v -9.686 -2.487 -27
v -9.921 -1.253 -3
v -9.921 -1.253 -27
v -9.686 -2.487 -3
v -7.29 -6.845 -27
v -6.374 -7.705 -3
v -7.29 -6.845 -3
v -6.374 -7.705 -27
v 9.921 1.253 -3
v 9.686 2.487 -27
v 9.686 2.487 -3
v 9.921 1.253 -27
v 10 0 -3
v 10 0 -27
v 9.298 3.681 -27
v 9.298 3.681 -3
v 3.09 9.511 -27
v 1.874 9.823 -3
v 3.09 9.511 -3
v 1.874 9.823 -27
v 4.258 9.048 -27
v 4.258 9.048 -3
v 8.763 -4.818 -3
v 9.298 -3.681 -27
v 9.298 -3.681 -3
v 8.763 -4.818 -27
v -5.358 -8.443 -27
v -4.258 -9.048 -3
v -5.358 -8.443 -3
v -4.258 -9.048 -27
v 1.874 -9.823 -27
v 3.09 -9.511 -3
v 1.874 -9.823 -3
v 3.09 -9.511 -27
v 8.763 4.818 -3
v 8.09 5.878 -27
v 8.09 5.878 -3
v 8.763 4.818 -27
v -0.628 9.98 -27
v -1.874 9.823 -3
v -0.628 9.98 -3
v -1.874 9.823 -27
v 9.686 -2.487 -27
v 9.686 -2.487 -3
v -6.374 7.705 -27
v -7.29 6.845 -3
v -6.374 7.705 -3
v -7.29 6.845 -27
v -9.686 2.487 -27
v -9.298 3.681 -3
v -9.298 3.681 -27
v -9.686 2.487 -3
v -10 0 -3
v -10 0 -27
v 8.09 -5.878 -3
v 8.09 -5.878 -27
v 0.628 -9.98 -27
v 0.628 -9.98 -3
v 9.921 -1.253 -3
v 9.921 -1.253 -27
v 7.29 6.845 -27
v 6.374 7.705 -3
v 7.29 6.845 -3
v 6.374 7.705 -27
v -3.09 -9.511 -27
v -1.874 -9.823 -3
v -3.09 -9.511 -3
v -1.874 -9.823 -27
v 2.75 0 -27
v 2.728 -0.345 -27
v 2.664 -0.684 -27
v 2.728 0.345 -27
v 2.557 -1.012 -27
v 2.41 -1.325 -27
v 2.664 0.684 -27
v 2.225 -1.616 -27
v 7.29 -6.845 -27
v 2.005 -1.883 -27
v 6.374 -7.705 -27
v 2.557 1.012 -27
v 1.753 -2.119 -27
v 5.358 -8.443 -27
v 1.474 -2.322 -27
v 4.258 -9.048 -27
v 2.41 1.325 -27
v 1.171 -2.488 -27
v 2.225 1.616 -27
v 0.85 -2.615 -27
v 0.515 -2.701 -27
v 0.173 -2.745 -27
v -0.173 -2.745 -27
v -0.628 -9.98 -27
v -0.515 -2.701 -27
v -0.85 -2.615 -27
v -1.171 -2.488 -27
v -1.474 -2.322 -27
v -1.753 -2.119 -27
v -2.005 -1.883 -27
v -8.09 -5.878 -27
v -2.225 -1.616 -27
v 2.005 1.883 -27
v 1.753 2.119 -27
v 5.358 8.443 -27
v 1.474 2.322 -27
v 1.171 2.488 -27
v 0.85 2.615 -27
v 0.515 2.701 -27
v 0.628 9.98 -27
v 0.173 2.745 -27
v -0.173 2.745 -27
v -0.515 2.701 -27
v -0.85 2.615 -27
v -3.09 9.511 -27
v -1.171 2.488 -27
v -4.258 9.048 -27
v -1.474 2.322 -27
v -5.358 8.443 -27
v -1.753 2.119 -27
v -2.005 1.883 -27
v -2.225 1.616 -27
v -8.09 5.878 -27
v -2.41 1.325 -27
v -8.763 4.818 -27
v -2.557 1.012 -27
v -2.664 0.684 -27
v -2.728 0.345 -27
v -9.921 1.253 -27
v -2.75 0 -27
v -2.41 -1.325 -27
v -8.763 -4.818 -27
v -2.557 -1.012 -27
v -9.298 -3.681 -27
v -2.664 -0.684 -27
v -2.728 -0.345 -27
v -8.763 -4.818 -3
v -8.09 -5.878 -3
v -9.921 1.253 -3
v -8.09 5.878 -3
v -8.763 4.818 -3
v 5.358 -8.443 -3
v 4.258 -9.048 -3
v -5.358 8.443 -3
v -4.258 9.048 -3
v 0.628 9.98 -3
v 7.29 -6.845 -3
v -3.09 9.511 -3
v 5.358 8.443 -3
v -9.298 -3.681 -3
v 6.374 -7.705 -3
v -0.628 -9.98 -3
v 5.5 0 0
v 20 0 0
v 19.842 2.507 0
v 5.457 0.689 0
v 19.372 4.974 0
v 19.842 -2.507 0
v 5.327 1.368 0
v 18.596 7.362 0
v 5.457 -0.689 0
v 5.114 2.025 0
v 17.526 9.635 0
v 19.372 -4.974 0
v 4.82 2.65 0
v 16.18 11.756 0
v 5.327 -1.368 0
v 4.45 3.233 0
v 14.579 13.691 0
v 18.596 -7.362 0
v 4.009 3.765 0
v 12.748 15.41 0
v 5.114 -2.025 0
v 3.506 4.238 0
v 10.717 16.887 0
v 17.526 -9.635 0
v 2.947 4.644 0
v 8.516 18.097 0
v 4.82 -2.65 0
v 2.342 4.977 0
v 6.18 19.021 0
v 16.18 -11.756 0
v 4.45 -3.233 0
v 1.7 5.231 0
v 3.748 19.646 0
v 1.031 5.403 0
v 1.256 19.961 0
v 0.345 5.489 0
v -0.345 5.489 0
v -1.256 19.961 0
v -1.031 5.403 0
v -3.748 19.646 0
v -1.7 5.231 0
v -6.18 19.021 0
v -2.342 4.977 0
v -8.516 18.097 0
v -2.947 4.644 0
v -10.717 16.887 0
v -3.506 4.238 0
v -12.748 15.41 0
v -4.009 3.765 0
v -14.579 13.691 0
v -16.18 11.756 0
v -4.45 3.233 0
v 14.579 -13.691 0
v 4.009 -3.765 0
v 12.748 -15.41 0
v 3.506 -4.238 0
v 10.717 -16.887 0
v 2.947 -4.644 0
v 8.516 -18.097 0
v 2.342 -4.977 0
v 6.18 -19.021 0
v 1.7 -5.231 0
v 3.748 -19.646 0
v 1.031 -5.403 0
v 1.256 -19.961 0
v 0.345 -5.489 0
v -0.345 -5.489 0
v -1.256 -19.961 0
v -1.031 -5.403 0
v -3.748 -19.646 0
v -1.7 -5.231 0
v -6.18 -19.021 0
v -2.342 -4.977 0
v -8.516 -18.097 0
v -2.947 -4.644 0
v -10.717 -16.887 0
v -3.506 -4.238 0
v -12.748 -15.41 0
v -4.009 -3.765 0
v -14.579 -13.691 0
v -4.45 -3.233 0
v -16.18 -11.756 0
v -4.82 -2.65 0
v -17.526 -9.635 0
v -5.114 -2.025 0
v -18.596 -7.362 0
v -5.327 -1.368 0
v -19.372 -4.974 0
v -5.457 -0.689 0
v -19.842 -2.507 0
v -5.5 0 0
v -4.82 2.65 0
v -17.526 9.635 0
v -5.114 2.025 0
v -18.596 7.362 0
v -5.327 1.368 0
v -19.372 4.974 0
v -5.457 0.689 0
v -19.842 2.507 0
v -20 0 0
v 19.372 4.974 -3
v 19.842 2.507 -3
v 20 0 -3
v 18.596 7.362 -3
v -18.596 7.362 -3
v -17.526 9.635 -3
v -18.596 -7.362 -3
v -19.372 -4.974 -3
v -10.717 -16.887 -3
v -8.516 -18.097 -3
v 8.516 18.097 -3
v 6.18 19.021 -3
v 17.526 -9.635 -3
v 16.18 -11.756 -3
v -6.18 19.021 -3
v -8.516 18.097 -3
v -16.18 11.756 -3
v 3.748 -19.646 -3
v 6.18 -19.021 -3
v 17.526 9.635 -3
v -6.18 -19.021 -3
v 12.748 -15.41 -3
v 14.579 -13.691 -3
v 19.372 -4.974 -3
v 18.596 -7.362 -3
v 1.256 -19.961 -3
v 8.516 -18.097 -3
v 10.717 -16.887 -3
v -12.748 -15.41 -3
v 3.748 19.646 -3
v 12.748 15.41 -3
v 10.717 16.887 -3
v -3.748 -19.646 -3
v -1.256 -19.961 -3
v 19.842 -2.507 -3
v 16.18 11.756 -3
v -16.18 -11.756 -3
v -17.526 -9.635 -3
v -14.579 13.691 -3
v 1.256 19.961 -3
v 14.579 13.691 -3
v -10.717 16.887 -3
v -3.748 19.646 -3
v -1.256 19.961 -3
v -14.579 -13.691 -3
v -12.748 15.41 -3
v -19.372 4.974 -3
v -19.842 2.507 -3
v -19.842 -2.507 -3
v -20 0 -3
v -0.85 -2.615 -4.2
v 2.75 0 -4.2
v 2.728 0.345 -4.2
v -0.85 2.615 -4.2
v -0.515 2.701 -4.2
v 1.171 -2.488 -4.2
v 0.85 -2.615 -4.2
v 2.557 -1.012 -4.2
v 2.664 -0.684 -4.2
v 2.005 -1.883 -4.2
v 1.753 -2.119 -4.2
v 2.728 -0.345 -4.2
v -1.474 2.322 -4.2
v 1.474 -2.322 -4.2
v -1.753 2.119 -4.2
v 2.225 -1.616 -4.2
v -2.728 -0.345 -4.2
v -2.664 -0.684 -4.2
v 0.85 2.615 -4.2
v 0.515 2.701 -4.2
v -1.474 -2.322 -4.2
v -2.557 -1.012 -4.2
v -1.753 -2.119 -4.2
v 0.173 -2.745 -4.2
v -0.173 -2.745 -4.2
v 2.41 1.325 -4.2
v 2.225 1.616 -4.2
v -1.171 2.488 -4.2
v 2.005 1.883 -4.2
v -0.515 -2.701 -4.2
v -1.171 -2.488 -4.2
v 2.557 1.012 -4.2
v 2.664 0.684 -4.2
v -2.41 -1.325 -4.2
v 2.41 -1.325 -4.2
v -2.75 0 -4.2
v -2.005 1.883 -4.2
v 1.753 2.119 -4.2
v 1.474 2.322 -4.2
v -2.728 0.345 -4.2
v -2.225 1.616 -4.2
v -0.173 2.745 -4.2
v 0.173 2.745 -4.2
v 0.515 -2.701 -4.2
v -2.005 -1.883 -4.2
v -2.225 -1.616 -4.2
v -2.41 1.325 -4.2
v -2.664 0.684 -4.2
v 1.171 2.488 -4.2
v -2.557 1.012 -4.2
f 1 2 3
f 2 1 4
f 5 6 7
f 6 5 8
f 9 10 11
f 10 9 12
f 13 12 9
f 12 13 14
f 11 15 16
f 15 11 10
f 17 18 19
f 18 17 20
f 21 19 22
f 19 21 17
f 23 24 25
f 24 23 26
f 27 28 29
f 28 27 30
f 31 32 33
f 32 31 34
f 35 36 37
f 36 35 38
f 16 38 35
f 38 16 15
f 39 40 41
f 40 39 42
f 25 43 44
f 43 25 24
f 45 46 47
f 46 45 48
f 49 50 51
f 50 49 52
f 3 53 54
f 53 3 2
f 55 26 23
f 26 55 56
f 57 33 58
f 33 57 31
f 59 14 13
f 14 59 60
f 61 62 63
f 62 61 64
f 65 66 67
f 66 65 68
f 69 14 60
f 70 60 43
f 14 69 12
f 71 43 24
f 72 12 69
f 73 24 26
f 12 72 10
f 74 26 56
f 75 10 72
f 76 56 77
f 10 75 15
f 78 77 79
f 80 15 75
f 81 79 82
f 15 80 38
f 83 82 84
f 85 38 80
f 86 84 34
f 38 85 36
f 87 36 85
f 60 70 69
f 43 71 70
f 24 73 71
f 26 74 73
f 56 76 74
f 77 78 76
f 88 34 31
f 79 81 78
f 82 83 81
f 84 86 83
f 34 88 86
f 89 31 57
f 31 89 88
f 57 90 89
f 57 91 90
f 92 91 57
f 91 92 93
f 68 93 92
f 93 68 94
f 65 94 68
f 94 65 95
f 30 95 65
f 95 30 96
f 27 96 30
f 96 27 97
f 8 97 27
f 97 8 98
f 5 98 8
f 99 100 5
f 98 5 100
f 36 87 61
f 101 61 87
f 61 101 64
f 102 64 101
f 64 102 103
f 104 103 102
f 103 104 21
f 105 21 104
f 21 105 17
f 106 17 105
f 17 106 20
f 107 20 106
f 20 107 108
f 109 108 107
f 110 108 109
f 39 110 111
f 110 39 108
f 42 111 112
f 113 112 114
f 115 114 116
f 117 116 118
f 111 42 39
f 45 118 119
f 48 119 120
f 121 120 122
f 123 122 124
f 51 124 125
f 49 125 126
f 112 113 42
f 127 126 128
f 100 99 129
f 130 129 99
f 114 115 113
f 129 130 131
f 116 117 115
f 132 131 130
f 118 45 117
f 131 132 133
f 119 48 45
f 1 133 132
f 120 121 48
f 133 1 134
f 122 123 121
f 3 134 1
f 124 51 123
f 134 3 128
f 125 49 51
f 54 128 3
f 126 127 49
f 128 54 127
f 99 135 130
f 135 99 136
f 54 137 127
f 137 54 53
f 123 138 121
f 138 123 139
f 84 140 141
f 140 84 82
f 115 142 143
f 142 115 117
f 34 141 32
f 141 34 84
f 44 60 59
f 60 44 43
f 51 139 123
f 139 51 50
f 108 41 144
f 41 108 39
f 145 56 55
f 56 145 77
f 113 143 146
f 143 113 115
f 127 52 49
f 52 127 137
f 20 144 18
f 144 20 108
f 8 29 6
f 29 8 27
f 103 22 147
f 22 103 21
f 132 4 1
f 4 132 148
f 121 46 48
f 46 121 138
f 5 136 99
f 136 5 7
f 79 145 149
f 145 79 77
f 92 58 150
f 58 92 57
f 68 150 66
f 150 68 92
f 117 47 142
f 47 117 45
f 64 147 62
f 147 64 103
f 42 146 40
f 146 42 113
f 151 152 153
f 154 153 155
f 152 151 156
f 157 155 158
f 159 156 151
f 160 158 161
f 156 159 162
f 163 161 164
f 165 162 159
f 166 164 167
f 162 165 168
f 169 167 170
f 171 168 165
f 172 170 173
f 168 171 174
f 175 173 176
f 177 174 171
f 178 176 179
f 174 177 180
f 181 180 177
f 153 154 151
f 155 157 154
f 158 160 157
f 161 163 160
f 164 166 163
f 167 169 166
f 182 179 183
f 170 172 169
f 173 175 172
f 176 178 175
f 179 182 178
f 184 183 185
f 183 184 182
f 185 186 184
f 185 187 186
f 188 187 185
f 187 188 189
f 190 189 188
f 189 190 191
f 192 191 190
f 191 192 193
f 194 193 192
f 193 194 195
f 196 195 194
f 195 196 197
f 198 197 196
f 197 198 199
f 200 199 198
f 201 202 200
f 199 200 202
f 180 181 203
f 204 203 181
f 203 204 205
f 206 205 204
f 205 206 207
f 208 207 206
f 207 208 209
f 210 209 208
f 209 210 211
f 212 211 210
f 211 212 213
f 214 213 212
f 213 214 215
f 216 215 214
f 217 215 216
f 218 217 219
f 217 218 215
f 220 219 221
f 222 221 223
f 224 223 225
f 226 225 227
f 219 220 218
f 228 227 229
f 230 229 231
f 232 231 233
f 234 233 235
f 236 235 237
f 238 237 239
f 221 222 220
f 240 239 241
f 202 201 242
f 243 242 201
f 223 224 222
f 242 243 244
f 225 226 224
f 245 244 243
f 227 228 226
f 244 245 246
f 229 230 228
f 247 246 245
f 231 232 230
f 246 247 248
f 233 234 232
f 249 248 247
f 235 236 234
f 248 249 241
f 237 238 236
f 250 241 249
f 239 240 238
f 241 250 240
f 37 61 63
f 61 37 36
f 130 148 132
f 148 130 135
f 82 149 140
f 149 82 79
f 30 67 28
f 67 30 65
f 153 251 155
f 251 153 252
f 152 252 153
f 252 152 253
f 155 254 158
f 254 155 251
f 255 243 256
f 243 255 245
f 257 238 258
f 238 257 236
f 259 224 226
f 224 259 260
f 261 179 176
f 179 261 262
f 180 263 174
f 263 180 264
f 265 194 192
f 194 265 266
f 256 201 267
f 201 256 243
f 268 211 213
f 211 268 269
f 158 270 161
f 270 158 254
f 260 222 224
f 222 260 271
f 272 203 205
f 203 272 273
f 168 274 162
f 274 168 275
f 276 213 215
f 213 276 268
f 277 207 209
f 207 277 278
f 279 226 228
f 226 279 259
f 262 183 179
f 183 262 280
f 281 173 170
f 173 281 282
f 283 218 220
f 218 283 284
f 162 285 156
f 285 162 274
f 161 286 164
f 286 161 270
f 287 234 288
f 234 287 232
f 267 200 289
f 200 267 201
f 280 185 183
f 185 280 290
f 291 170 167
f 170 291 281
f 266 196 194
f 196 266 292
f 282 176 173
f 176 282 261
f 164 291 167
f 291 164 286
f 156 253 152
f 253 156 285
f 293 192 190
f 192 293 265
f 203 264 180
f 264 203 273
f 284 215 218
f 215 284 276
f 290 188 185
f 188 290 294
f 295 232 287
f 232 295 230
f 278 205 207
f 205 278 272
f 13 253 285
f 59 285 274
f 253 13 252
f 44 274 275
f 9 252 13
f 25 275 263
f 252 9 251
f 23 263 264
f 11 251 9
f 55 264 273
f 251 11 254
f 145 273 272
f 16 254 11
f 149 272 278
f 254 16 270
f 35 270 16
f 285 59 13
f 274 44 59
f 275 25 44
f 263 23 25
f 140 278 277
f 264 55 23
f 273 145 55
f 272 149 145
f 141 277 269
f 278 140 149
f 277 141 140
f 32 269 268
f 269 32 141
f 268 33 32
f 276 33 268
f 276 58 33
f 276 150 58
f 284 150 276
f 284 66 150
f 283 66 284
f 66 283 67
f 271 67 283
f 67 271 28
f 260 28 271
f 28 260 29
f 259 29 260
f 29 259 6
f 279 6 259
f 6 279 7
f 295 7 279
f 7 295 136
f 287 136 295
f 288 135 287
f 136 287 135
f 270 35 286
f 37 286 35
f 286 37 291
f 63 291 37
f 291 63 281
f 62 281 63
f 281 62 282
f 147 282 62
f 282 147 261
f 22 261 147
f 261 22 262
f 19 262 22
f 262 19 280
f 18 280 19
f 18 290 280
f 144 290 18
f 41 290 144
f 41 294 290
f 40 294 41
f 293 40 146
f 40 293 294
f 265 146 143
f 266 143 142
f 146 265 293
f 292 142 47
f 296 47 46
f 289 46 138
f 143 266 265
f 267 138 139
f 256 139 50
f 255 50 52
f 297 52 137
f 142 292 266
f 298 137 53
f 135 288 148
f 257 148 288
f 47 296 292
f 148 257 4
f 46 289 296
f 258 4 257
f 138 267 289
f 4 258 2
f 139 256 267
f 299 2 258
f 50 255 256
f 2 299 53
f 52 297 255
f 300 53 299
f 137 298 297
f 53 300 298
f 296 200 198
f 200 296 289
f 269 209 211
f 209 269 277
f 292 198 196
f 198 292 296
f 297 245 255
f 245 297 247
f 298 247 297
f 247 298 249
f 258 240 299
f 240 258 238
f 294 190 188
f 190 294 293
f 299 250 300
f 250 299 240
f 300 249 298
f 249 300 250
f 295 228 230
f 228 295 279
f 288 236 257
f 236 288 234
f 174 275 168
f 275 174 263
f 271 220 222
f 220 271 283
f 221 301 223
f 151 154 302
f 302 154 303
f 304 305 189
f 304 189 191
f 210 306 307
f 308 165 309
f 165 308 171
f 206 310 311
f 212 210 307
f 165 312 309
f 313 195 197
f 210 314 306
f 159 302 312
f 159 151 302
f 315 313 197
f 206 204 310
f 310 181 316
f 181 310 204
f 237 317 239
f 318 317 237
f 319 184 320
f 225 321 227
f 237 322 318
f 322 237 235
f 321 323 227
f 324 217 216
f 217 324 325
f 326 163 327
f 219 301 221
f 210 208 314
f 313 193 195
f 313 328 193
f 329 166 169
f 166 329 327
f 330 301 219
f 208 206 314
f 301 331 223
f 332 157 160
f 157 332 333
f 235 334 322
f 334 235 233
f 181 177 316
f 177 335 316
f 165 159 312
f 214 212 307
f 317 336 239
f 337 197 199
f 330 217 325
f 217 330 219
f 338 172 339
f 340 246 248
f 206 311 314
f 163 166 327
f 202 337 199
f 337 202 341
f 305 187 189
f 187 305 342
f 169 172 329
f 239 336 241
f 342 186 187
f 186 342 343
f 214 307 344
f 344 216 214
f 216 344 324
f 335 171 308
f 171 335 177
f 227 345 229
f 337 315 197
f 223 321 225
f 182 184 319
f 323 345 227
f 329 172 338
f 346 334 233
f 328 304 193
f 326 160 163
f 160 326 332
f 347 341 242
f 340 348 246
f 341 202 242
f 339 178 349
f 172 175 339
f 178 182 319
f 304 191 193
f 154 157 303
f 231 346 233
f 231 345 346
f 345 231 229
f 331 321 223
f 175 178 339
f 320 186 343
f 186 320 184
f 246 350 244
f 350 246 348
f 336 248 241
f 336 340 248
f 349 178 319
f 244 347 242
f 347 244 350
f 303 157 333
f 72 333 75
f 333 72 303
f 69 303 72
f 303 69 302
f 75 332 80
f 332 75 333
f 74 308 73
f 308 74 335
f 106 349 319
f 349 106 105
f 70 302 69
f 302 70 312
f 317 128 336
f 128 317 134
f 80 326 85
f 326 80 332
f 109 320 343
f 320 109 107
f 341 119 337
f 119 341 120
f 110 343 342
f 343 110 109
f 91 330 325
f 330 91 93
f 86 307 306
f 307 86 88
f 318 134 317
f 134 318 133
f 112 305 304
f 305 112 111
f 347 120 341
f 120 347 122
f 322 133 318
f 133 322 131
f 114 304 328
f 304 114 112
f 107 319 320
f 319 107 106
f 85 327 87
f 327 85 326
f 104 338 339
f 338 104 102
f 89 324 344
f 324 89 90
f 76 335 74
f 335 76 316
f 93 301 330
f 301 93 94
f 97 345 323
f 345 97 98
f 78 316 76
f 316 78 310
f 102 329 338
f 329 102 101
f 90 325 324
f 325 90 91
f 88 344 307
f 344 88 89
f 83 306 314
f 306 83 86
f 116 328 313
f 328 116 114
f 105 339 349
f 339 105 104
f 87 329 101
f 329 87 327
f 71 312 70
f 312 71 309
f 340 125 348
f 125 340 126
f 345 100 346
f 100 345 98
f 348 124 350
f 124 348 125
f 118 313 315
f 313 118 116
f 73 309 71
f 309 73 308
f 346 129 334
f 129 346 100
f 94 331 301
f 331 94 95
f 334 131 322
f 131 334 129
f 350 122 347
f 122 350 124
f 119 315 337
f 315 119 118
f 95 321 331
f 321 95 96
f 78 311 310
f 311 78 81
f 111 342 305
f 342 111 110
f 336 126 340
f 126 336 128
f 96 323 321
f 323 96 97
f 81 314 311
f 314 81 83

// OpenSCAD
$fn = 50;


difference() {
	union() {
		translate(v = [0, 0, -27.0000000000]) {
			cylinder(h = 27, r = 10.0000000000);
		}
		translate(v = [0, 0, -3.0000000000]) {
			cylinder(h = 3, r = 20.0000000000);
		}
	}
	union() {
		translate(v = [0, 0, 0]) {
			rotate(a = [0, 0, 0]) {
				difference() {
					union() {
						#translate(v = [0, 0, -27.0000000000]) {
							cylinder(h = 27, r = 2.2500000000);
						}
						#translate(v = [0, 0, -4.2000000000]) {
							cylinder(h = 4.2000000000, r = 10.0000000000, r1 = 2.7500000000, r2 = 5.5000000000);
						}
						#translate(v = [0, 0, -27.0000000000]) {
							cylinder(h = 27, r = 2.7500000000);
						}
						#translate(v = [0, 0, -27.0000000000]) {
							cylinder(h = 27, r = 2.2500000000);
						}
					}
					union();
				}
			}
		}
	}
}
